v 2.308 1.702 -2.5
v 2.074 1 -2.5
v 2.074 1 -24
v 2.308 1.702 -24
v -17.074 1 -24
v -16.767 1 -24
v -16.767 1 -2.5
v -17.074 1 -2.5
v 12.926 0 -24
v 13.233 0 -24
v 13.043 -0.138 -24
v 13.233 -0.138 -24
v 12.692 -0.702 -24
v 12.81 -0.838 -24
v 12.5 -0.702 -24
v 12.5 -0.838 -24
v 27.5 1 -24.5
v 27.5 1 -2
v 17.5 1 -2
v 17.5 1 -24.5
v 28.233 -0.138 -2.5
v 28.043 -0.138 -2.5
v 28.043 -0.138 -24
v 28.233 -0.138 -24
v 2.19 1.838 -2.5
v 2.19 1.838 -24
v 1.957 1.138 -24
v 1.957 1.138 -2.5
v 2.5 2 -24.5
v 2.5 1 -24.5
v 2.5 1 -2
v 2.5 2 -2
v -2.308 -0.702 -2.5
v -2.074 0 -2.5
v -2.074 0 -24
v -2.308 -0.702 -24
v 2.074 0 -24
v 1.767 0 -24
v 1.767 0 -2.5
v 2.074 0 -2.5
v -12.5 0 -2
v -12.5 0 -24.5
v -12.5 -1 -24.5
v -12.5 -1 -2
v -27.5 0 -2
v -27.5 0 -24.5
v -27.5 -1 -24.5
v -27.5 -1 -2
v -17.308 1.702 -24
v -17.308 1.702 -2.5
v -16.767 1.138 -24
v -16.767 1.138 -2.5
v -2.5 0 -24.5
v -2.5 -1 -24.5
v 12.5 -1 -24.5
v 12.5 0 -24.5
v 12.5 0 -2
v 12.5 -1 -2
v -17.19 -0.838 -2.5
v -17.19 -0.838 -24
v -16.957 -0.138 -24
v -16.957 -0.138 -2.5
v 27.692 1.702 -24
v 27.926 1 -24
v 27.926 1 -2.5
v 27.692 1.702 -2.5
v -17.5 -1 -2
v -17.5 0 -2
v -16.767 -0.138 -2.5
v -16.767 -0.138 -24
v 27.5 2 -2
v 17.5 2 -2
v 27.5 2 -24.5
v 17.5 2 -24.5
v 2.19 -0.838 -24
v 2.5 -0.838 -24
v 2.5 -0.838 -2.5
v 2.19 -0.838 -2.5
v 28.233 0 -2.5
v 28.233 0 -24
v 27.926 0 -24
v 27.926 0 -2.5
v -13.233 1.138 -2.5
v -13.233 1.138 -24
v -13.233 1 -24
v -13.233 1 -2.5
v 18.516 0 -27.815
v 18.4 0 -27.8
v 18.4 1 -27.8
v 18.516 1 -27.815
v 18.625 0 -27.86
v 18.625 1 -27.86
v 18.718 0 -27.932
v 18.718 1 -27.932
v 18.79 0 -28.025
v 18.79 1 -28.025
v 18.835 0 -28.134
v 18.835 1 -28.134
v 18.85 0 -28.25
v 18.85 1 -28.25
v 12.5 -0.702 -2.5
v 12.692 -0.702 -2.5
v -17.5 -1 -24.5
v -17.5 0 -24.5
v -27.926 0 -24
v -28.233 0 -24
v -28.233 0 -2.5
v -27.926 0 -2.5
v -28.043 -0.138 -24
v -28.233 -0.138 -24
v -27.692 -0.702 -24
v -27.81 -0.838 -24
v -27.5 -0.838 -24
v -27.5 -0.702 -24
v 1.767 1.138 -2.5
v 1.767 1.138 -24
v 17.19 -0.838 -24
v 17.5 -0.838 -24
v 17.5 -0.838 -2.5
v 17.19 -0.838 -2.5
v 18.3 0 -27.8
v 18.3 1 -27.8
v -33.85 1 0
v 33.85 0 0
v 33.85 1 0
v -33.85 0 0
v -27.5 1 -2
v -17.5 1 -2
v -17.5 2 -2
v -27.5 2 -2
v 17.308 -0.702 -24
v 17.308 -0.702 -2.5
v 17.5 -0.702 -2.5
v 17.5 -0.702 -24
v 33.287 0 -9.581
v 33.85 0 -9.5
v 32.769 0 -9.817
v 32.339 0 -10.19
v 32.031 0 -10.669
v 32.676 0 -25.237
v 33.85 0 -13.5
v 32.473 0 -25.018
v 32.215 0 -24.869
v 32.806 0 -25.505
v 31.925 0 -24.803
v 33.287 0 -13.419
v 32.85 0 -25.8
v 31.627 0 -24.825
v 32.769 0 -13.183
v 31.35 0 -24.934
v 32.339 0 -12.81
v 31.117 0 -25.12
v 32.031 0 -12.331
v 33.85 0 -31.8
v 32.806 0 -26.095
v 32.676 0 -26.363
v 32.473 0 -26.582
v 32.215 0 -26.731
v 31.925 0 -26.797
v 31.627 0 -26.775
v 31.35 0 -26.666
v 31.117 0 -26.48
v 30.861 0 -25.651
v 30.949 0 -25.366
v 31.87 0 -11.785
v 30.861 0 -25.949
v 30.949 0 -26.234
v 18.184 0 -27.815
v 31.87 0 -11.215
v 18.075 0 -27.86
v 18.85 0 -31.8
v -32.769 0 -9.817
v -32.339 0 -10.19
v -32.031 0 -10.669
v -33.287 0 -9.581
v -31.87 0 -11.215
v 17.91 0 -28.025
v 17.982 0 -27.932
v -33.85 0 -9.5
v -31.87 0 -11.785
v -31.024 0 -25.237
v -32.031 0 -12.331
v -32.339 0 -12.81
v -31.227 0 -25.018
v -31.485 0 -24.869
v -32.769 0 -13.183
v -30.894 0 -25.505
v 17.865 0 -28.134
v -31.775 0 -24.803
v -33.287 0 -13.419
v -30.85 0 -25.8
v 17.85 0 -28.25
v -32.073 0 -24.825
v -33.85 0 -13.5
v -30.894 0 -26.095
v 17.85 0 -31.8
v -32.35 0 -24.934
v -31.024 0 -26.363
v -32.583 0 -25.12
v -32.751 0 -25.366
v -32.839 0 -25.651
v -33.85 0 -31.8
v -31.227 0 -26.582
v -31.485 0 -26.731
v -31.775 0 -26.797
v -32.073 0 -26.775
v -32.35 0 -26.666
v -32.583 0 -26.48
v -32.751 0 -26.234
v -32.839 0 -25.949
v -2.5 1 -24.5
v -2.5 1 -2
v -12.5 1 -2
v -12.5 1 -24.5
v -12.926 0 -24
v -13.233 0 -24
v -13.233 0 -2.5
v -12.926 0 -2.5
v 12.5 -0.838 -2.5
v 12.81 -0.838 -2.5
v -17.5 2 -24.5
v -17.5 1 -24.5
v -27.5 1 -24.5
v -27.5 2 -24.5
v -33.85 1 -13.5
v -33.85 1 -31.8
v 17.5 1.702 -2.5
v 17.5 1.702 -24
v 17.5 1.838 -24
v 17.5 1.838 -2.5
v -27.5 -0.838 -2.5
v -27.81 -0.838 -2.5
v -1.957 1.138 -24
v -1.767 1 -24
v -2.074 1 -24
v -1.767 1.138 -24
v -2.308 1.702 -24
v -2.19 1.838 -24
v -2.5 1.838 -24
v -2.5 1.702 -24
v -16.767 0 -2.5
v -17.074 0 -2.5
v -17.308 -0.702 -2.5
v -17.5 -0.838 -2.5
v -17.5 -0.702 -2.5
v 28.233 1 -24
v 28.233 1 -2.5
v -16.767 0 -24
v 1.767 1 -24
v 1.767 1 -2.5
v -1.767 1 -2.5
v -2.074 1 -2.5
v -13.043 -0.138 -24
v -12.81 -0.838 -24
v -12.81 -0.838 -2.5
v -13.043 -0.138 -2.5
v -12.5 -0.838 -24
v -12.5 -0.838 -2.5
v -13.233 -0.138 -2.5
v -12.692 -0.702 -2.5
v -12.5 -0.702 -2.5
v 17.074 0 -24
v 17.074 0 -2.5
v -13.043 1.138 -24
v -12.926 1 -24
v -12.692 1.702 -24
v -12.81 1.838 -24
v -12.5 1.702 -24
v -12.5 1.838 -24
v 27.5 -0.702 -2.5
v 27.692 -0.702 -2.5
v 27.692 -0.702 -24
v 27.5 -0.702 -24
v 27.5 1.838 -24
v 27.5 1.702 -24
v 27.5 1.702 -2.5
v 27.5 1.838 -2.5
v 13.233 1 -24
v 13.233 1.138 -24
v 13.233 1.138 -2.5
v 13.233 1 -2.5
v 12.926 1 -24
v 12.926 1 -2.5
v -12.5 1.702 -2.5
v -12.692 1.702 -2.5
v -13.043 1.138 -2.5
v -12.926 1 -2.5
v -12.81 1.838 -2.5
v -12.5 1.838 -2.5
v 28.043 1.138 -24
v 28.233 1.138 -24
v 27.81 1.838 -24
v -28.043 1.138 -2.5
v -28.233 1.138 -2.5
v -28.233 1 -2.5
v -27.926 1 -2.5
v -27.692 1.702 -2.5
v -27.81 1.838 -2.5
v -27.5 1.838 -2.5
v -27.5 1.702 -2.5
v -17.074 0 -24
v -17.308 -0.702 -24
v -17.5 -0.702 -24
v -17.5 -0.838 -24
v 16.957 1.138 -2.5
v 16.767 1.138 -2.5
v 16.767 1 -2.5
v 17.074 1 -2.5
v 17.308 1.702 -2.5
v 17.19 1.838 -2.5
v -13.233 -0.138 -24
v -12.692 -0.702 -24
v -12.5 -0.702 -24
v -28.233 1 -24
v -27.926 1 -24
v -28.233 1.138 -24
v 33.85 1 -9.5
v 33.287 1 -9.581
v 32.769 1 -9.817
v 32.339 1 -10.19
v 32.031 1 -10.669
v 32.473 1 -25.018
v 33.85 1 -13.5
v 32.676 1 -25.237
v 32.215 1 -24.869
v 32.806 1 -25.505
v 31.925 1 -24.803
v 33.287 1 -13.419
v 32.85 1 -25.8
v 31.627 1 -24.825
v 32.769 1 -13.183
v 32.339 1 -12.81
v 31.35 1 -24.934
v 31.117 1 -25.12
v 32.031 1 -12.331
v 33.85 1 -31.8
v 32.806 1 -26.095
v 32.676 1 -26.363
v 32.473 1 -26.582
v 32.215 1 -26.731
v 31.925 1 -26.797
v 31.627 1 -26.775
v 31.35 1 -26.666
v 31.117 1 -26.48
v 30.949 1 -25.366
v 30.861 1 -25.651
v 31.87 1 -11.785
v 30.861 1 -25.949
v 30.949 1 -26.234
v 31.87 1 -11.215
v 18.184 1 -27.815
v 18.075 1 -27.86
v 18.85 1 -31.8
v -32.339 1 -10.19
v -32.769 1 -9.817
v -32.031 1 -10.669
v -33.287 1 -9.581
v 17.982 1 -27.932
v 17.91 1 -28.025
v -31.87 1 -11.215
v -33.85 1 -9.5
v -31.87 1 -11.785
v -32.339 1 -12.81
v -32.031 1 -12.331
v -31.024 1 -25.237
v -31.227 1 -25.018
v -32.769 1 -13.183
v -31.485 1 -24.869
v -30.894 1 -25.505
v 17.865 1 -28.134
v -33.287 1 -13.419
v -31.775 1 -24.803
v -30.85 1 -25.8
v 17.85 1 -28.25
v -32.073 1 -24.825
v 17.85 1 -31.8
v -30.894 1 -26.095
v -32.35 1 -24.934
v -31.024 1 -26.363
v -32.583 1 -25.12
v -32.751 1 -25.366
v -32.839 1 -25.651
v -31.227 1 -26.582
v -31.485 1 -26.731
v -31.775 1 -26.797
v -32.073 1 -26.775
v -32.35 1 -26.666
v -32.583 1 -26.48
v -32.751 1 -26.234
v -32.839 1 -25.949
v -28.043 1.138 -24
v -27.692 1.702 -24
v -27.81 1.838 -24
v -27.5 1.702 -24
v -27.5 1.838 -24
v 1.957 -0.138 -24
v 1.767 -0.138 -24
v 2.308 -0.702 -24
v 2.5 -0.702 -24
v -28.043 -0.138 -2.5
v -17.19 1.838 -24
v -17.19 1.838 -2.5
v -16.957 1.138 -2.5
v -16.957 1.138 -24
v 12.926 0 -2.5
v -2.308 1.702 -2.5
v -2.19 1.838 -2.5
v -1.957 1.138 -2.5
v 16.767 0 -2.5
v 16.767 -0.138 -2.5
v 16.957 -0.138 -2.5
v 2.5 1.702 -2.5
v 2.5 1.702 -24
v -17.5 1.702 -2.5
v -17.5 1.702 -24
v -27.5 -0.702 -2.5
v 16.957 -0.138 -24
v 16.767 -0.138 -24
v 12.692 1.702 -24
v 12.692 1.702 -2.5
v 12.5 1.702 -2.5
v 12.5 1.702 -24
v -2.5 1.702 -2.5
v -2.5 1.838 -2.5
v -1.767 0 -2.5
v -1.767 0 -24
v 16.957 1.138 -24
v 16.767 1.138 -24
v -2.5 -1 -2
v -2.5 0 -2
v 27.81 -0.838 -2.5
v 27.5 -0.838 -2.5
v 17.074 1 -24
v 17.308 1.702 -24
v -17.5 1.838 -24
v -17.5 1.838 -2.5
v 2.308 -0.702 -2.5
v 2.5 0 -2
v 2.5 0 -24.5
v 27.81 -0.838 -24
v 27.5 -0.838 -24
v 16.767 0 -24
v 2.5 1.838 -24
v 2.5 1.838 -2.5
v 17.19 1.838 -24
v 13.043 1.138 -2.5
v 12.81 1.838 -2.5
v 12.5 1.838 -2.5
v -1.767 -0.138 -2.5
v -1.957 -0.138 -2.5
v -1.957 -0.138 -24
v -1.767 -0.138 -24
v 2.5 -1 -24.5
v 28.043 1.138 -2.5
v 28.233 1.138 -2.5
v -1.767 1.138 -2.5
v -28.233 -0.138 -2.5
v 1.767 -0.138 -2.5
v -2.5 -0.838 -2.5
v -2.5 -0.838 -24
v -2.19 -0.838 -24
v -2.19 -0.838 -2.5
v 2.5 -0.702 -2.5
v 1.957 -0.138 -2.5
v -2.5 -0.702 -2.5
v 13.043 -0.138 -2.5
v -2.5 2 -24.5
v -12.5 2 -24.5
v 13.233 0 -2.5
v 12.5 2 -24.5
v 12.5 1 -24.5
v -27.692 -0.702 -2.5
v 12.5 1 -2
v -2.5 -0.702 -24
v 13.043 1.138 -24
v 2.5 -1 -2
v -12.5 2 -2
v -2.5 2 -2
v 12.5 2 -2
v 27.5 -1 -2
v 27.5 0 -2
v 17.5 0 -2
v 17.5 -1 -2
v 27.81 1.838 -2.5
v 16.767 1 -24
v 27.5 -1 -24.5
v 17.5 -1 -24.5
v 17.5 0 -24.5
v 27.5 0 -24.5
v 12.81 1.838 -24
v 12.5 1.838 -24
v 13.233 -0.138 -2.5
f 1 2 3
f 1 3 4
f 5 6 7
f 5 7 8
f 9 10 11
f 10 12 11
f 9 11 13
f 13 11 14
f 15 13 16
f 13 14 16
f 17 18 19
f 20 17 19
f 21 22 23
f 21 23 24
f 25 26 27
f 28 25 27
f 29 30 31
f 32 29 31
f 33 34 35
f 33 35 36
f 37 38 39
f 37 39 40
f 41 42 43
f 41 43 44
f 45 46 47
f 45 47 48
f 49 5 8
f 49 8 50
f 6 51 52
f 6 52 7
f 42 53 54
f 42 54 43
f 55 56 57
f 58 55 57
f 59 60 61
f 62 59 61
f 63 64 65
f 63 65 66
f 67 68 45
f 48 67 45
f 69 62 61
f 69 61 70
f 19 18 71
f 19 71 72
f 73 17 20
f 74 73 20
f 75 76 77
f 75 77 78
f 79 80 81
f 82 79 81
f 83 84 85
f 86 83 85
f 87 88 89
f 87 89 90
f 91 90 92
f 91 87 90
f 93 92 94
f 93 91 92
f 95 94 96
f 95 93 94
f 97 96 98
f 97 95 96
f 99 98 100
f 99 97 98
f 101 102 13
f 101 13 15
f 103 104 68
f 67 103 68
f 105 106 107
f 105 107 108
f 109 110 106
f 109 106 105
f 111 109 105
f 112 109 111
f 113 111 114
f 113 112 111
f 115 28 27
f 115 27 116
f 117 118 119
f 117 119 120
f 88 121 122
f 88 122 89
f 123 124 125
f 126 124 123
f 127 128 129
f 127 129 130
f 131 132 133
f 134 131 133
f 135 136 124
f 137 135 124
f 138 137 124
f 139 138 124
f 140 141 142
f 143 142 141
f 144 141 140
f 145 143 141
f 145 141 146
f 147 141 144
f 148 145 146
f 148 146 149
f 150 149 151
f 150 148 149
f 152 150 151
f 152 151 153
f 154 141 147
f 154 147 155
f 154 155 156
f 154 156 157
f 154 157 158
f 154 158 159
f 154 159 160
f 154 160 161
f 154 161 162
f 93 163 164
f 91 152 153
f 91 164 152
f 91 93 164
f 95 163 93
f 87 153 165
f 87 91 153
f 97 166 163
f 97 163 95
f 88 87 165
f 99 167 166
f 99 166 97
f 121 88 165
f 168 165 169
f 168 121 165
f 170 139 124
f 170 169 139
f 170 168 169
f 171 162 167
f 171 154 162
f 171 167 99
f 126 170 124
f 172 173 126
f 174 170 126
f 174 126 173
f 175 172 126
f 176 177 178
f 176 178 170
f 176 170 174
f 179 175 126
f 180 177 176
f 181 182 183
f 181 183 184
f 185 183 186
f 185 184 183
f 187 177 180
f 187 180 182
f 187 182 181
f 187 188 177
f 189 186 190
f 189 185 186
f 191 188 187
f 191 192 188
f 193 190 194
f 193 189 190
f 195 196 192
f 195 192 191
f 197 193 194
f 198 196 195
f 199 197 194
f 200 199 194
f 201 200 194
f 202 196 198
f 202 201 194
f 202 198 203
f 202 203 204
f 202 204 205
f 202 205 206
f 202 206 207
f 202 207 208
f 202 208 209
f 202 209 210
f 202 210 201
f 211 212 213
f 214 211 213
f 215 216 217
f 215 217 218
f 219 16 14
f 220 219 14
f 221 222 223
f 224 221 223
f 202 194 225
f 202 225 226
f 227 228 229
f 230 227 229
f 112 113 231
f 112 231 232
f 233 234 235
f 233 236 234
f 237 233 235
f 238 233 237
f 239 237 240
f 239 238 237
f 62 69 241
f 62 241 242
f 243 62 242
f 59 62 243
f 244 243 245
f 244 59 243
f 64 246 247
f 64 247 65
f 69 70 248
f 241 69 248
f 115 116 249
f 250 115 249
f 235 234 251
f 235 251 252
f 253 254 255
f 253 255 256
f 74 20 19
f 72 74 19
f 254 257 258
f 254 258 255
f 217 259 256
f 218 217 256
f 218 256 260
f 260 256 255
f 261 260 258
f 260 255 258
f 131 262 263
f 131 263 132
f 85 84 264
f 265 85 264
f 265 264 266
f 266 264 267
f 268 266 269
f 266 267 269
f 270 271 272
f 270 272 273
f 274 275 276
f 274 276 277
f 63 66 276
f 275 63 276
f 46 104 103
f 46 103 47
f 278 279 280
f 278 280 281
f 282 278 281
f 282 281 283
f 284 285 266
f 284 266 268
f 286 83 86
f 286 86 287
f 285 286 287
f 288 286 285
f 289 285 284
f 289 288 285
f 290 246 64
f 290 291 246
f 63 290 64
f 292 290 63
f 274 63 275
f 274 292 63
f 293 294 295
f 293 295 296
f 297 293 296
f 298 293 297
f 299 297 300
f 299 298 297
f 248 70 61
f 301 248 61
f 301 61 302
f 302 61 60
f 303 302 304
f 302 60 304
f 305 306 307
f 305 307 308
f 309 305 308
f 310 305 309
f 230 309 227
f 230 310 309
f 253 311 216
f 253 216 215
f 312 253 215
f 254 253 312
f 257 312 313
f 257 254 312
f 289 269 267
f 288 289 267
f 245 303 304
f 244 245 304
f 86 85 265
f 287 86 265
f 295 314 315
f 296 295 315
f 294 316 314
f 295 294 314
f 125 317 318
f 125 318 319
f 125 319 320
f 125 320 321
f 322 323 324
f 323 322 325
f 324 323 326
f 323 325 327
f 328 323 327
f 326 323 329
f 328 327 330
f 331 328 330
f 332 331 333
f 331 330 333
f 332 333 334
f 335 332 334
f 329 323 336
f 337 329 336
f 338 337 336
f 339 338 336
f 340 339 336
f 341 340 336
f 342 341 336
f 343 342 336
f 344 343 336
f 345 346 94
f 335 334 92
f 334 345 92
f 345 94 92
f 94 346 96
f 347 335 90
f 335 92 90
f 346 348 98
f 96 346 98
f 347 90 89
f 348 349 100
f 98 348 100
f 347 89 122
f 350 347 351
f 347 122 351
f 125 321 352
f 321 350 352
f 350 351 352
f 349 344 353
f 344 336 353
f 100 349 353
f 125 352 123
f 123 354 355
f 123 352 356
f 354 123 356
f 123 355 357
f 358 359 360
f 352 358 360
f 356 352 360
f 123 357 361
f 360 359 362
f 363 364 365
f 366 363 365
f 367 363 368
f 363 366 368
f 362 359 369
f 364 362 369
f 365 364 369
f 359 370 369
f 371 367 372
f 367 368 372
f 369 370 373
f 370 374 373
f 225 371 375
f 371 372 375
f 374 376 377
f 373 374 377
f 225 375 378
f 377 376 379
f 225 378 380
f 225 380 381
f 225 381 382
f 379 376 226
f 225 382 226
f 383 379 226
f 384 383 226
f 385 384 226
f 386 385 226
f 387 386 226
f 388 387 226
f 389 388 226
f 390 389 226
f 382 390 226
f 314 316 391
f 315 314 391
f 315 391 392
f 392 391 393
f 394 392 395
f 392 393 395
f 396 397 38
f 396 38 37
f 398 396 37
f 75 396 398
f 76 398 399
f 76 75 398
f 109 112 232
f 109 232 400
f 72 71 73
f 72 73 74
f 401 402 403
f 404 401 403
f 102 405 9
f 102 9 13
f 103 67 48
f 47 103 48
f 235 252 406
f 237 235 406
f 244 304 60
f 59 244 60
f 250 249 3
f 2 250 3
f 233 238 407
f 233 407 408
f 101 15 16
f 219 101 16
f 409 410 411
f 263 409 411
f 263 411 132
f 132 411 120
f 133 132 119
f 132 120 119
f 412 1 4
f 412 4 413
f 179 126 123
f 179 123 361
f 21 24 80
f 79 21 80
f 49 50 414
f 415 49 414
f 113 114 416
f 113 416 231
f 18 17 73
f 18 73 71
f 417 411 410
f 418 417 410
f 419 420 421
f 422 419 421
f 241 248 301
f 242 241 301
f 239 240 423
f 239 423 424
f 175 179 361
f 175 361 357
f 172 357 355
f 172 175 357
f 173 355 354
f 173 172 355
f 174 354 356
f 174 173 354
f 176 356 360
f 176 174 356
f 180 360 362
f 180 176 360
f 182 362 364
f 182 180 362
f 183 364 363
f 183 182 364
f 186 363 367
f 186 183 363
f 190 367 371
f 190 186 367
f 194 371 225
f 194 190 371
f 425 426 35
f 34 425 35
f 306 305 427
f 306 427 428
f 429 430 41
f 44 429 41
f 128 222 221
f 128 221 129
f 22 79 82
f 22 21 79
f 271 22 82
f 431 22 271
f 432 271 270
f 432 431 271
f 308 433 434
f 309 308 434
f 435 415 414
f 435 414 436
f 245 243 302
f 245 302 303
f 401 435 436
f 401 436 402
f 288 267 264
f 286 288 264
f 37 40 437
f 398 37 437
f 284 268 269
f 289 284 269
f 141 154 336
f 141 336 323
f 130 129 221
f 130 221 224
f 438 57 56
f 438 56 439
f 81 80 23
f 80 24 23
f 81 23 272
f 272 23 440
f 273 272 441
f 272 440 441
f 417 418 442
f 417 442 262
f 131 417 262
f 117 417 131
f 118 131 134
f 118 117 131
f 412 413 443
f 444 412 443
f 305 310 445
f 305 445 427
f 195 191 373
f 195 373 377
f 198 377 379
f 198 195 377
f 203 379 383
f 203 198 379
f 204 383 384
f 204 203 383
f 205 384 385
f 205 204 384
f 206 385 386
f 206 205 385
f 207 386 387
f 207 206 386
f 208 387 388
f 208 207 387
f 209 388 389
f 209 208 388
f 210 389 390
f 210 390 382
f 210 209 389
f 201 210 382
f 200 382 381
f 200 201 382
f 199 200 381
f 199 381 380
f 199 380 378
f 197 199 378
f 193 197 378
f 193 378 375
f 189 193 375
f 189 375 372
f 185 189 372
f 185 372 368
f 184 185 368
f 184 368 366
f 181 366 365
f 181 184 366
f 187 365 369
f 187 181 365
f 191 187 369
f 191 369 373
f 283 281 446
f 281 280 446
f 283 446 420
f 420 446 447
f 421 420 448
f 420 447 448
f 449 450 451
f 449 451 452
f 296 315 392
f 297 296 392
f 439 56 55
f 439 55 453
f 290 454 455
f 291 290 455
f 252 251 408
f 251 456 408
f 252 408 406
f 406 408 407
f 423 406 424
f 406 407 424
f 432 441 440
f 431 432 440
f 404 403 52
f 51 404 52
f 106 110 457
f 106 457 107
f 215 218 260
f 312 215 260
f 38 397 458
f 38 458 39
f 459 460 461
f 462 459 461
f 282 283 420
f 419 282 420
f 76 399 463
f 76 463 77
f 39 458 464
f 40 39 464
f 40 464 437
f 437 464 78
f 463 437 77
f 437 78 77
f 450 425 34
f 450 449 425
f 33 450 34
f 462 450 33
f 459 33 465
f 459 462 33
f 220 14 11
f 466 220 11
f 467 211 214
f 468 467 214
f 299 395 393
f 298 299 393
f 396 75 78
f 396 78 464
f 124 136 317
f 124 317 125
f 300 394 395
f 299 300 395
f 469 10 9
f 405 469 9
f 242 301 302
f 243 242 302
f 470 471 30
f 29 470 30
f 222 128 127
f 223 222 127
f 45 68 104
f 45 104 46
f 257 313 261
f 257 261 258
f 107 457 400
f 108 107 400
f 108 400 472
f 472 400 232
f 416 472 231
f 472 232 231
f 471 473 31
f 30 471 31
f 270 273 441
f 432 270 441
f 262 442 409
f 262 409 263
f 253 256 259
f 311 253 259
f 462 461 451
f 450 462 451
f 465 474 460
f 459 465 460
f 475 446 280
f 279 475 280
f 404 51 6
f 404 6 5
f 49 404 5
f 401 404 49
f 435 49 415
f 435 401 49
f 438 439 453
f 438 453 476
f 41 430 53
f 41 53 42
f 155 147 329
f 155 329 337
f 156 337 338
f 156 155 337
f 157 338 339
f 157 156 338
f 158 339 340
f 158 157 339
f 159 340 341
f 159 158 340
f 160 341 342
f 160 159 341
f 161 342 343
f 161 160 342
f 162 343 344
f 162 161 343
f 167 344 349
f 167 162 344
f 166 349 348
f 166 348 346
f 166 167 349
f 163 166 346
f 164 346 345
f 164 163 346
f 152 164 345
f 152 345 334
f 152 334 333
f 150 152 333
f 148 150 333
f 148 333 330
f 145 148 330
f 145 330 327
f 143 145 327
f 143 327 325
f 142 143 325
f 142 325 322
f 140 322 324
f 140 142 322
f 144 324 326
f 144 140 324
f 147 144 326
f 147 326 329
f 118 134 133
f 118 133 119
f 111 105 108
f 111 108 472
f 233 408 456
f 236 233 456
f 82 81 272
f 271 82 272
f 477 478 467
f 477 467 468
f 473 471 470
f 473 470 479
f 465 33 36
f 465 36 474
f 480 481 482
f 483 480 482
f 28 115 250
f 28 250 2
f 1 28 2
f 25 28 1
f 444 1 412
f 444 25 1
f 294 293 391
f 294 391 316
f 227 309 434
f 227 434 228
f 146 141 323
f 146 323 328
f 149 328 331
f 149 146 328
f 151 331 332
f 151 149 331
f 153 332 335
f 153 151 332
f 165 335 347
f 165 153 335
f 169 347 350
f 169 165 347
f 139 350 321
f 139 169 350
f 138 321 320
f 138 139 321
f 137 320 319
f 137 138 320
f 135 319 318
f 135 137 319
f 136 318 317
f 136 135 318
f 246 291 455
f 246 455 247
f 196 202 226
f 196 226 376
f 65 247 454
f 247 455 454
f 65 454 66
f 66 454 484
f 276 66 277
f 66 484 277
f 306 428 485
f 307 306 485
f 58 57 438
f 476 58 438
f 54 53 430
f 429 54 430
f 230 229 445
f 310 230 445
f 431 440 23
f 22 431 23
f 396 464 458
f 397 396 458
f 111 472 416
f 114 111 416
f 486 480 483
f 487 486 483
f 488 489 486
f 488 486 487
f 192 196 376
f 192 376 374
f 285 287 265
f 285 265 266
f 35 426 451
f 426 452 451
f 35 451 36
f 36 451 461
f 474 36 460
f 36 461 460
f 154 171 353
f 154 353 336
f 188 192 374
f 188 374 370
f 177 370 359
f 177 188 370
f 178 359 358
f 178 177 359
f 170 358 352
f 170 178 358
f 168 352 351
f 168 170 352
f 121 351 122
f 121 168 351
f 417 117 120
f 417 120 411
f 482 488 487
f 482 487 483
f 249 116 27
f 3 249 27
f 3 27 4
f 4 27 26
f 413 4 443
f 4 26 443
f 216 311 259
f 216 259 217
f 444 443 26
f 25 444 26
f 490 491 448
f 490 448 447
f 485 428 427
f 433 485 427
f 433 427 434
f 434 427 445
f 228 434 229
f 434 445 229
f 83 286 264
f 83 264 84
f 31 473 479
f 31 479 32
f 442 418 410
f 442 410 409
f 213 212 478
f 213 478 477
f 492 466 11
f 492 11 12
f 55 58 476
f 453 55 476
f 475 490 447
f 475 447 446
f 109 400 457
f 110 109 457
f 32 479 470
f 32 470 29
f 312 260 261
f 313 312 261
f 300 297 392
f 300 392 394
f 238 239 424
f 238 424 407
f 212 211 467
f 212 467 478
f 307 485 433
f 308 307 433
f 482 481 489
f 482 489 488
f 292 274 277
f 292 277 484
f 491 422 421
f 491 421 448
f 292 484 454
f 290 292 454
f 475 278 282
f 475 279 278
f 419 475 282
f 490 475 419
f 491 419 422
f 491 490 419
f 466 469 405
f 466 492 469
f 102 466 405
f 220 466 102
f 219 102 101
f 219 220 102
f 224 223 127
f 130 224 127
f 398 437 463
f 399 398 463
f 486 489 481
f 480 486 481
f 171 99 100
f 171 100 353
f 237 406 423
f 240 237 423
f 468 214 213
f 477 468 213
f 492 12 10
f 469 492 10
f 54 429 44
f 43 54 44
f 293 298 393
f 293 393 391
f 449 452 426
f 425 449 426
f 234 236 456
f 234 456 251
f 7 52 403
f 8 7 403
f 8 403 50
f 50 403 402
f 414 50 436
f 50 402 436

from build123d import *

# Parameters (mm, degrees)
CROQUIS1_R       = 1
EXTRUIR1_DEPTH   = 1
CROQUIS2_W       = 10
CROQUIS2_H       = 22.5
EXTRUIR2_DEPTH   = 1
EXTRUIR2_2_DEPTH = 1
EXTRUIR2_3_DEPTH = 1
EXTRUIR2_4_DEPTH = 1
EXTRUIR3_DEPTH   = 21.5
EXTRUIR3_2_DEPTH = 21.5
EXTRUIR3_3_DEPTH = 21.5
EXTRUIR3_4_DEPTH = 21.5
EXTRUIR3_5_DEPTH = 21.5
EXTRUIR3_6_DEPTH = 21.5
EXTRUIR3_7_DEPTH = 21.5
EXTRUIR3_8_DEPTH = 21.5


with BuildPart() as part:
    # Croquis1 → Extruir1 (new body)
    with BuildSketch(Plane(origin=(0, 0, 0), x_dir=(1, 0, 0), z_dir=(0, 1, 0))):
        with BuildLine():
            Line((33.85, 9.5), (33.85, 0))
            Line((33.85, 0), (-33.85, 0))
            Line((-33.85, 0), (-33.85, 9.5))
            ThreePointArc((-33.85, 9.5), (-31.85, 11.5), (-33.85, 13.5))
            Line((-33.85, 13.5), (-33.85, 31.8))
            Line((-33.85, 31.8), (17.85, 31.8))
            Line((17.85, 31.8), (17.85, 28.25))
            ThreePointArc((17.85, 28.25), (17.981801948, 27.931801948), (18.3, 27.8))
            Line((18.3, 27.8), (18.4, 27.8))
            ThreePointArc((18.4, 27.8), (18.718198052, 27.931801948), (18.85, 28.25))
            Line((18.85, 28.25), (18.85, 31.8))
            Line((18.85, 31.8), (33.85, 31.8))
            Line((33.85, 31.8), (33.85, 13.5))
            ThreePointArc((33.85, 13.5), (31.85, 11.5), (33.85, 9.5))
        make_face()
        with Locations((31.85, 25.8)):
            Circle(CROQUIS1_R, mode=Mode.SUBTRACT)
        with Locations((-31.85, 25.8)):
            Circle(CROQUIS1_R, mode=Mode.SUBTRACT)
    extrude(amount=EXTRUIR1_DEPTH)


with BuildPart() as body_2:
    # Croquis2 → Extruir2 (new body)
    with BuildSketch(Plane(origin=(0, 1, 0), x_dir=(-1, 0, 0), z_dir=(0, 1, 0))):
        with Locations((7.5, -13.25)):
            Rectangle(CROQUIS2_W, CROQUIS2_H)
    extrude(amount=EXTRUIR2_DEPTH)


with BuildPart() as body_3:
    # Croquis2 → Extruir2 2 (new body)
    with BuildSketch(Plane(origin=(0, 1, 0), x_dir=(-1, 0, 0), z_dir=(0, 1, 0))):
        with Locations((22.5, -13.25)):
            Rectangle(CROQUIS2_W, CROQUIS2_H)
    extrude(amount=EXTRUIR2_2_DEPTH)


with BuildPart() as body_4:
    # Croquis2 → Extruir2 3 (new body)
    with BuildSketch(Plane(origin=(0, 1, 0), x_dir=(-1, 0, 0), z_dir=(0, 1, 0))):
        with Locations((-22.5, -13.25)):
            Rectangle(CROQUIS2_W, CROQUIS2_H)
    extrude(amount=EXTRUIR2_3_DEPTH)


with BuildPart() as body_5:
    # Croquis2 → Extruir2 4 (new body)
    with BuildSketch(Plane(origin=(0, 1, 0), x_dir=(-1, 0, 0), z_dir=(0, 1, 0))):
        with Locations((-7.5, -13.25)):
            Rectangle(CROQUIS2_W, CROQUIS2_H)
    extrude(amount=EXTRUIR2_4_DEPTH)


with BuildPart() as body_6:
    # Croquis3 → Extruir3 (new body)
    with BuildSketch(Plane(origin=(0, 0, -24), x_dir=(-1, 0, 0), z_dir=(0, 0, -1))):
        Polygon((27.5, 1.838454184), (27.80957835, 1.838454184), (28.043008569, 1.138163525), (28.232670623, 1.138163525), (28.232670623, 1), (27.926293459, 1), (27.692264471, 1.702086966), (27.5, 1.702086966), align=None)
    extrude(amount=-EXTRUIR3_DEPTH)


with BuildPart() as body_7:
    # Croquis3 → Extruir3 2 (new body)
    with BuildSketch(Plane(origin=(0, 0, -24), x_dir=(-1, 0, 0), z_dir=(0, 0, -1))):
        Polygon((17.5, 1.702086966), (17.5, 1.838454184), (17.19042165, 1.838454184), (16.956991431, 1.138163525), (16.767329377, 1.138163525), (16.767329377, 1), (17.073706541, 1), (17.307735529, 1.702086966), align=None)
    extrude(amount=-EXTRUIR3_2_DEPTH)


with BuildPart() as body_8:
    # Croquis3 → Extruir3 3 (new body)
    with BuildSketch(Plane(origin=(0, 0, -24), x_dir=(-1, 0, 0), z_dir=(0, 0, -1))):
        Polygon((1.767329377, 1), (2.073706541, 1), (2.307735529, 1.702086966), (2.5, 1.702086966), (2.5, 1.838454184), (2.19042165, 1.838454184), (1.956991431, 1.138163525), (1.767329377, 1.138163525), align=None)
    extrude(amount=-EXTRUIR3_3_DEPTH)


with BuildPart() as body_9:
    # Croquis3 → Extruir3 4 (new body)
    with BuildSketch(Plane(origin=(0, 0, -24), x_dir=(-1, 0, 0), z_dir=(0, 0, -1))):
        Polygon((12.80957835, 1.838454184), (13.043008569, 1.138163525), (13.232670623, 1.138163525), (13.232670623, 1), (12.926293459, 1), (12.692264471, 1.702086966), (12.5, 1.702086966), (12.5, 1.838454184), align=None)
    extrude(amount=-EXTRUIR3_4_DEPTH)


with BuildPart() as body_10:
    # Croquis3 → Extruir3 5 (new body)
    with BuildSketch(Plane(origin=(0, 0, -24), x_dir=(-1, 0, 0), z_dir=(0, 0, -1))):
        Polygon((-13.232670623, 1), (-12.926293459, 1), (-12.692264471, 1.702086966), (-12.5, 1.702086966), (-12.5, 1.838454184), (-12.80957835, 1.838454184), (-13.043008569, 1.138163525), (-13.232670623, 1.138163525), align=None)
    extrude(amount=-EXTRUIR3_5_DEPTH)


with BuildPart() as body_11:
    # Croquis3 → Extruir3 6 (new body)
    with BuildSketch(Plane(origin=(0, 0, -24), x_dir=(-1, 0, 0), z_dir=(0, 0, -1))):
        Polygon((-2.19042165, 1.838454184), (-1.956991431, 1.138163525), (-1.767329377, 1.138163525), (-1.767329377, 1), (-2.073706541, 1), (-2.307735529, 1.702086966), (-2.5, 1.702086966), (-2.5, 1.838454184), align=None)
    extrude(amount=-EXTRUIR3_6_DEPTH)


with BuildPart() as body_12:
    # Croquis3 → Extruir3 7 (new body)
    with BuildSketch(Plane(origin=(0, 0, -24), x_dir=(-1, 0, 0), z_dir=(0, 0, -1))):
        Polygon((-28.232670623, 1), (-27.926293459, 1), (-27.692264471, 1.702086966), (-27.5, 1.702086966), (-27.5, 1.838454184), (-27.80957835, 1.838454184), (-28.043008569, 1.138163525), (-28.232670623, 1.138163525), align=None)
    extrude(amount=-EXTRUIR3_7_DEPTH)


with BuildPart() as body_13:
    # Croquis3 → Extruir3 8 (new body)
    with BuildSketch(Plane(origin=(0, 0, -24), x_dir=(-1, 0, 0), z_dir=(0, 0, -1))):
        Polygon((-17.19042165, 1.838454184), (-16.956991431, 1.138163525), (-16.767329377, 1.138163525), (-16.767329377, 1), (-17.073706541, 1), (-17.307735529, 1.702086966), (-17.5, 1.702086966), (-17.5, 1.838454184), align=None)
    extrude(amount=-EXTRUIR3_8_DEPTH)


with BuildPart() as body_14:
    # Simetría2: mirrored copy
    add(body_4.part.mirror(Plane.ZX.offset(0.5)))


with BuildPart() as body_15:
    # Simetr_a2 2: mirrored copy
    add(body_5.part.mirror(Plane.ZX.offset(0.5)))


with BuildPart() as body_16:
    # Simetr_a2 3: mirrored copy
    add(body_2.part.mirror(Plane.ZX.offset(0.5)))


with BuildPart() as body_17:
    # Simetr_a2 4: mirrored copy
    add(body_3.part.mirror(Plane.ZX.offset(0.5)))


with BuildPart() as body_18:
    # Simetr_a2 5: mirrored copy
    add(body_9.part.mirror(Plane.ZX.offset(0.5)))


with BuildPart() as body_19:
    # Simetr_a2 6: mirrored copy
    add(body_6.part.mirror(Plane.ZX.offset(0.5)))


with BuildPart() as body_20:
    # Simetr_a2 7: mirrored copy
    add(body_11.part.mirror(Plane.ZX.offset(0.5)))


with BuildPart() as body_21:
    # Simetr_a2 8: mirrored copy
    add(body_13.part.mirror(Plane.ZX.offset(0.5)))


with BuildPart() as body_22:
    # Simetr_a2 9: mirrored copy
    add(body_12.part.mirror(Plane.ZX.offset(0.5)))


with BuildPart() as body_23:
    # Simetr_a2 10: mirrored copy
    add(body_10.part.mirror(Plane.ZX.offset(0.5)))


with BuildPart() as body_24:
    # Simetr_a2 11: mirrored copy
    add(body_8.part.mirror(Plane.ZX.offset(0.5)))


with BuildPart() as body_25:
    # Simetr_a2 12: mirrored copy
    add(body_7.part.mirror(Plane.ZX.offset(0.5)))


solid = Compound([part.part, body_2.part, body_3.part, body_4.part, body_5.part, body_6.part, body_7.part, body_8.part, body_9.part, body_10.part, body_11.part, body_12.part, body_13.part, body_14.part, body_15.part, body_16.part, body_17.part, body_18.part, body_19.part, body_20.part, body_21.part, body_22.part, body_23.part, body_24.part, body_25.part])
